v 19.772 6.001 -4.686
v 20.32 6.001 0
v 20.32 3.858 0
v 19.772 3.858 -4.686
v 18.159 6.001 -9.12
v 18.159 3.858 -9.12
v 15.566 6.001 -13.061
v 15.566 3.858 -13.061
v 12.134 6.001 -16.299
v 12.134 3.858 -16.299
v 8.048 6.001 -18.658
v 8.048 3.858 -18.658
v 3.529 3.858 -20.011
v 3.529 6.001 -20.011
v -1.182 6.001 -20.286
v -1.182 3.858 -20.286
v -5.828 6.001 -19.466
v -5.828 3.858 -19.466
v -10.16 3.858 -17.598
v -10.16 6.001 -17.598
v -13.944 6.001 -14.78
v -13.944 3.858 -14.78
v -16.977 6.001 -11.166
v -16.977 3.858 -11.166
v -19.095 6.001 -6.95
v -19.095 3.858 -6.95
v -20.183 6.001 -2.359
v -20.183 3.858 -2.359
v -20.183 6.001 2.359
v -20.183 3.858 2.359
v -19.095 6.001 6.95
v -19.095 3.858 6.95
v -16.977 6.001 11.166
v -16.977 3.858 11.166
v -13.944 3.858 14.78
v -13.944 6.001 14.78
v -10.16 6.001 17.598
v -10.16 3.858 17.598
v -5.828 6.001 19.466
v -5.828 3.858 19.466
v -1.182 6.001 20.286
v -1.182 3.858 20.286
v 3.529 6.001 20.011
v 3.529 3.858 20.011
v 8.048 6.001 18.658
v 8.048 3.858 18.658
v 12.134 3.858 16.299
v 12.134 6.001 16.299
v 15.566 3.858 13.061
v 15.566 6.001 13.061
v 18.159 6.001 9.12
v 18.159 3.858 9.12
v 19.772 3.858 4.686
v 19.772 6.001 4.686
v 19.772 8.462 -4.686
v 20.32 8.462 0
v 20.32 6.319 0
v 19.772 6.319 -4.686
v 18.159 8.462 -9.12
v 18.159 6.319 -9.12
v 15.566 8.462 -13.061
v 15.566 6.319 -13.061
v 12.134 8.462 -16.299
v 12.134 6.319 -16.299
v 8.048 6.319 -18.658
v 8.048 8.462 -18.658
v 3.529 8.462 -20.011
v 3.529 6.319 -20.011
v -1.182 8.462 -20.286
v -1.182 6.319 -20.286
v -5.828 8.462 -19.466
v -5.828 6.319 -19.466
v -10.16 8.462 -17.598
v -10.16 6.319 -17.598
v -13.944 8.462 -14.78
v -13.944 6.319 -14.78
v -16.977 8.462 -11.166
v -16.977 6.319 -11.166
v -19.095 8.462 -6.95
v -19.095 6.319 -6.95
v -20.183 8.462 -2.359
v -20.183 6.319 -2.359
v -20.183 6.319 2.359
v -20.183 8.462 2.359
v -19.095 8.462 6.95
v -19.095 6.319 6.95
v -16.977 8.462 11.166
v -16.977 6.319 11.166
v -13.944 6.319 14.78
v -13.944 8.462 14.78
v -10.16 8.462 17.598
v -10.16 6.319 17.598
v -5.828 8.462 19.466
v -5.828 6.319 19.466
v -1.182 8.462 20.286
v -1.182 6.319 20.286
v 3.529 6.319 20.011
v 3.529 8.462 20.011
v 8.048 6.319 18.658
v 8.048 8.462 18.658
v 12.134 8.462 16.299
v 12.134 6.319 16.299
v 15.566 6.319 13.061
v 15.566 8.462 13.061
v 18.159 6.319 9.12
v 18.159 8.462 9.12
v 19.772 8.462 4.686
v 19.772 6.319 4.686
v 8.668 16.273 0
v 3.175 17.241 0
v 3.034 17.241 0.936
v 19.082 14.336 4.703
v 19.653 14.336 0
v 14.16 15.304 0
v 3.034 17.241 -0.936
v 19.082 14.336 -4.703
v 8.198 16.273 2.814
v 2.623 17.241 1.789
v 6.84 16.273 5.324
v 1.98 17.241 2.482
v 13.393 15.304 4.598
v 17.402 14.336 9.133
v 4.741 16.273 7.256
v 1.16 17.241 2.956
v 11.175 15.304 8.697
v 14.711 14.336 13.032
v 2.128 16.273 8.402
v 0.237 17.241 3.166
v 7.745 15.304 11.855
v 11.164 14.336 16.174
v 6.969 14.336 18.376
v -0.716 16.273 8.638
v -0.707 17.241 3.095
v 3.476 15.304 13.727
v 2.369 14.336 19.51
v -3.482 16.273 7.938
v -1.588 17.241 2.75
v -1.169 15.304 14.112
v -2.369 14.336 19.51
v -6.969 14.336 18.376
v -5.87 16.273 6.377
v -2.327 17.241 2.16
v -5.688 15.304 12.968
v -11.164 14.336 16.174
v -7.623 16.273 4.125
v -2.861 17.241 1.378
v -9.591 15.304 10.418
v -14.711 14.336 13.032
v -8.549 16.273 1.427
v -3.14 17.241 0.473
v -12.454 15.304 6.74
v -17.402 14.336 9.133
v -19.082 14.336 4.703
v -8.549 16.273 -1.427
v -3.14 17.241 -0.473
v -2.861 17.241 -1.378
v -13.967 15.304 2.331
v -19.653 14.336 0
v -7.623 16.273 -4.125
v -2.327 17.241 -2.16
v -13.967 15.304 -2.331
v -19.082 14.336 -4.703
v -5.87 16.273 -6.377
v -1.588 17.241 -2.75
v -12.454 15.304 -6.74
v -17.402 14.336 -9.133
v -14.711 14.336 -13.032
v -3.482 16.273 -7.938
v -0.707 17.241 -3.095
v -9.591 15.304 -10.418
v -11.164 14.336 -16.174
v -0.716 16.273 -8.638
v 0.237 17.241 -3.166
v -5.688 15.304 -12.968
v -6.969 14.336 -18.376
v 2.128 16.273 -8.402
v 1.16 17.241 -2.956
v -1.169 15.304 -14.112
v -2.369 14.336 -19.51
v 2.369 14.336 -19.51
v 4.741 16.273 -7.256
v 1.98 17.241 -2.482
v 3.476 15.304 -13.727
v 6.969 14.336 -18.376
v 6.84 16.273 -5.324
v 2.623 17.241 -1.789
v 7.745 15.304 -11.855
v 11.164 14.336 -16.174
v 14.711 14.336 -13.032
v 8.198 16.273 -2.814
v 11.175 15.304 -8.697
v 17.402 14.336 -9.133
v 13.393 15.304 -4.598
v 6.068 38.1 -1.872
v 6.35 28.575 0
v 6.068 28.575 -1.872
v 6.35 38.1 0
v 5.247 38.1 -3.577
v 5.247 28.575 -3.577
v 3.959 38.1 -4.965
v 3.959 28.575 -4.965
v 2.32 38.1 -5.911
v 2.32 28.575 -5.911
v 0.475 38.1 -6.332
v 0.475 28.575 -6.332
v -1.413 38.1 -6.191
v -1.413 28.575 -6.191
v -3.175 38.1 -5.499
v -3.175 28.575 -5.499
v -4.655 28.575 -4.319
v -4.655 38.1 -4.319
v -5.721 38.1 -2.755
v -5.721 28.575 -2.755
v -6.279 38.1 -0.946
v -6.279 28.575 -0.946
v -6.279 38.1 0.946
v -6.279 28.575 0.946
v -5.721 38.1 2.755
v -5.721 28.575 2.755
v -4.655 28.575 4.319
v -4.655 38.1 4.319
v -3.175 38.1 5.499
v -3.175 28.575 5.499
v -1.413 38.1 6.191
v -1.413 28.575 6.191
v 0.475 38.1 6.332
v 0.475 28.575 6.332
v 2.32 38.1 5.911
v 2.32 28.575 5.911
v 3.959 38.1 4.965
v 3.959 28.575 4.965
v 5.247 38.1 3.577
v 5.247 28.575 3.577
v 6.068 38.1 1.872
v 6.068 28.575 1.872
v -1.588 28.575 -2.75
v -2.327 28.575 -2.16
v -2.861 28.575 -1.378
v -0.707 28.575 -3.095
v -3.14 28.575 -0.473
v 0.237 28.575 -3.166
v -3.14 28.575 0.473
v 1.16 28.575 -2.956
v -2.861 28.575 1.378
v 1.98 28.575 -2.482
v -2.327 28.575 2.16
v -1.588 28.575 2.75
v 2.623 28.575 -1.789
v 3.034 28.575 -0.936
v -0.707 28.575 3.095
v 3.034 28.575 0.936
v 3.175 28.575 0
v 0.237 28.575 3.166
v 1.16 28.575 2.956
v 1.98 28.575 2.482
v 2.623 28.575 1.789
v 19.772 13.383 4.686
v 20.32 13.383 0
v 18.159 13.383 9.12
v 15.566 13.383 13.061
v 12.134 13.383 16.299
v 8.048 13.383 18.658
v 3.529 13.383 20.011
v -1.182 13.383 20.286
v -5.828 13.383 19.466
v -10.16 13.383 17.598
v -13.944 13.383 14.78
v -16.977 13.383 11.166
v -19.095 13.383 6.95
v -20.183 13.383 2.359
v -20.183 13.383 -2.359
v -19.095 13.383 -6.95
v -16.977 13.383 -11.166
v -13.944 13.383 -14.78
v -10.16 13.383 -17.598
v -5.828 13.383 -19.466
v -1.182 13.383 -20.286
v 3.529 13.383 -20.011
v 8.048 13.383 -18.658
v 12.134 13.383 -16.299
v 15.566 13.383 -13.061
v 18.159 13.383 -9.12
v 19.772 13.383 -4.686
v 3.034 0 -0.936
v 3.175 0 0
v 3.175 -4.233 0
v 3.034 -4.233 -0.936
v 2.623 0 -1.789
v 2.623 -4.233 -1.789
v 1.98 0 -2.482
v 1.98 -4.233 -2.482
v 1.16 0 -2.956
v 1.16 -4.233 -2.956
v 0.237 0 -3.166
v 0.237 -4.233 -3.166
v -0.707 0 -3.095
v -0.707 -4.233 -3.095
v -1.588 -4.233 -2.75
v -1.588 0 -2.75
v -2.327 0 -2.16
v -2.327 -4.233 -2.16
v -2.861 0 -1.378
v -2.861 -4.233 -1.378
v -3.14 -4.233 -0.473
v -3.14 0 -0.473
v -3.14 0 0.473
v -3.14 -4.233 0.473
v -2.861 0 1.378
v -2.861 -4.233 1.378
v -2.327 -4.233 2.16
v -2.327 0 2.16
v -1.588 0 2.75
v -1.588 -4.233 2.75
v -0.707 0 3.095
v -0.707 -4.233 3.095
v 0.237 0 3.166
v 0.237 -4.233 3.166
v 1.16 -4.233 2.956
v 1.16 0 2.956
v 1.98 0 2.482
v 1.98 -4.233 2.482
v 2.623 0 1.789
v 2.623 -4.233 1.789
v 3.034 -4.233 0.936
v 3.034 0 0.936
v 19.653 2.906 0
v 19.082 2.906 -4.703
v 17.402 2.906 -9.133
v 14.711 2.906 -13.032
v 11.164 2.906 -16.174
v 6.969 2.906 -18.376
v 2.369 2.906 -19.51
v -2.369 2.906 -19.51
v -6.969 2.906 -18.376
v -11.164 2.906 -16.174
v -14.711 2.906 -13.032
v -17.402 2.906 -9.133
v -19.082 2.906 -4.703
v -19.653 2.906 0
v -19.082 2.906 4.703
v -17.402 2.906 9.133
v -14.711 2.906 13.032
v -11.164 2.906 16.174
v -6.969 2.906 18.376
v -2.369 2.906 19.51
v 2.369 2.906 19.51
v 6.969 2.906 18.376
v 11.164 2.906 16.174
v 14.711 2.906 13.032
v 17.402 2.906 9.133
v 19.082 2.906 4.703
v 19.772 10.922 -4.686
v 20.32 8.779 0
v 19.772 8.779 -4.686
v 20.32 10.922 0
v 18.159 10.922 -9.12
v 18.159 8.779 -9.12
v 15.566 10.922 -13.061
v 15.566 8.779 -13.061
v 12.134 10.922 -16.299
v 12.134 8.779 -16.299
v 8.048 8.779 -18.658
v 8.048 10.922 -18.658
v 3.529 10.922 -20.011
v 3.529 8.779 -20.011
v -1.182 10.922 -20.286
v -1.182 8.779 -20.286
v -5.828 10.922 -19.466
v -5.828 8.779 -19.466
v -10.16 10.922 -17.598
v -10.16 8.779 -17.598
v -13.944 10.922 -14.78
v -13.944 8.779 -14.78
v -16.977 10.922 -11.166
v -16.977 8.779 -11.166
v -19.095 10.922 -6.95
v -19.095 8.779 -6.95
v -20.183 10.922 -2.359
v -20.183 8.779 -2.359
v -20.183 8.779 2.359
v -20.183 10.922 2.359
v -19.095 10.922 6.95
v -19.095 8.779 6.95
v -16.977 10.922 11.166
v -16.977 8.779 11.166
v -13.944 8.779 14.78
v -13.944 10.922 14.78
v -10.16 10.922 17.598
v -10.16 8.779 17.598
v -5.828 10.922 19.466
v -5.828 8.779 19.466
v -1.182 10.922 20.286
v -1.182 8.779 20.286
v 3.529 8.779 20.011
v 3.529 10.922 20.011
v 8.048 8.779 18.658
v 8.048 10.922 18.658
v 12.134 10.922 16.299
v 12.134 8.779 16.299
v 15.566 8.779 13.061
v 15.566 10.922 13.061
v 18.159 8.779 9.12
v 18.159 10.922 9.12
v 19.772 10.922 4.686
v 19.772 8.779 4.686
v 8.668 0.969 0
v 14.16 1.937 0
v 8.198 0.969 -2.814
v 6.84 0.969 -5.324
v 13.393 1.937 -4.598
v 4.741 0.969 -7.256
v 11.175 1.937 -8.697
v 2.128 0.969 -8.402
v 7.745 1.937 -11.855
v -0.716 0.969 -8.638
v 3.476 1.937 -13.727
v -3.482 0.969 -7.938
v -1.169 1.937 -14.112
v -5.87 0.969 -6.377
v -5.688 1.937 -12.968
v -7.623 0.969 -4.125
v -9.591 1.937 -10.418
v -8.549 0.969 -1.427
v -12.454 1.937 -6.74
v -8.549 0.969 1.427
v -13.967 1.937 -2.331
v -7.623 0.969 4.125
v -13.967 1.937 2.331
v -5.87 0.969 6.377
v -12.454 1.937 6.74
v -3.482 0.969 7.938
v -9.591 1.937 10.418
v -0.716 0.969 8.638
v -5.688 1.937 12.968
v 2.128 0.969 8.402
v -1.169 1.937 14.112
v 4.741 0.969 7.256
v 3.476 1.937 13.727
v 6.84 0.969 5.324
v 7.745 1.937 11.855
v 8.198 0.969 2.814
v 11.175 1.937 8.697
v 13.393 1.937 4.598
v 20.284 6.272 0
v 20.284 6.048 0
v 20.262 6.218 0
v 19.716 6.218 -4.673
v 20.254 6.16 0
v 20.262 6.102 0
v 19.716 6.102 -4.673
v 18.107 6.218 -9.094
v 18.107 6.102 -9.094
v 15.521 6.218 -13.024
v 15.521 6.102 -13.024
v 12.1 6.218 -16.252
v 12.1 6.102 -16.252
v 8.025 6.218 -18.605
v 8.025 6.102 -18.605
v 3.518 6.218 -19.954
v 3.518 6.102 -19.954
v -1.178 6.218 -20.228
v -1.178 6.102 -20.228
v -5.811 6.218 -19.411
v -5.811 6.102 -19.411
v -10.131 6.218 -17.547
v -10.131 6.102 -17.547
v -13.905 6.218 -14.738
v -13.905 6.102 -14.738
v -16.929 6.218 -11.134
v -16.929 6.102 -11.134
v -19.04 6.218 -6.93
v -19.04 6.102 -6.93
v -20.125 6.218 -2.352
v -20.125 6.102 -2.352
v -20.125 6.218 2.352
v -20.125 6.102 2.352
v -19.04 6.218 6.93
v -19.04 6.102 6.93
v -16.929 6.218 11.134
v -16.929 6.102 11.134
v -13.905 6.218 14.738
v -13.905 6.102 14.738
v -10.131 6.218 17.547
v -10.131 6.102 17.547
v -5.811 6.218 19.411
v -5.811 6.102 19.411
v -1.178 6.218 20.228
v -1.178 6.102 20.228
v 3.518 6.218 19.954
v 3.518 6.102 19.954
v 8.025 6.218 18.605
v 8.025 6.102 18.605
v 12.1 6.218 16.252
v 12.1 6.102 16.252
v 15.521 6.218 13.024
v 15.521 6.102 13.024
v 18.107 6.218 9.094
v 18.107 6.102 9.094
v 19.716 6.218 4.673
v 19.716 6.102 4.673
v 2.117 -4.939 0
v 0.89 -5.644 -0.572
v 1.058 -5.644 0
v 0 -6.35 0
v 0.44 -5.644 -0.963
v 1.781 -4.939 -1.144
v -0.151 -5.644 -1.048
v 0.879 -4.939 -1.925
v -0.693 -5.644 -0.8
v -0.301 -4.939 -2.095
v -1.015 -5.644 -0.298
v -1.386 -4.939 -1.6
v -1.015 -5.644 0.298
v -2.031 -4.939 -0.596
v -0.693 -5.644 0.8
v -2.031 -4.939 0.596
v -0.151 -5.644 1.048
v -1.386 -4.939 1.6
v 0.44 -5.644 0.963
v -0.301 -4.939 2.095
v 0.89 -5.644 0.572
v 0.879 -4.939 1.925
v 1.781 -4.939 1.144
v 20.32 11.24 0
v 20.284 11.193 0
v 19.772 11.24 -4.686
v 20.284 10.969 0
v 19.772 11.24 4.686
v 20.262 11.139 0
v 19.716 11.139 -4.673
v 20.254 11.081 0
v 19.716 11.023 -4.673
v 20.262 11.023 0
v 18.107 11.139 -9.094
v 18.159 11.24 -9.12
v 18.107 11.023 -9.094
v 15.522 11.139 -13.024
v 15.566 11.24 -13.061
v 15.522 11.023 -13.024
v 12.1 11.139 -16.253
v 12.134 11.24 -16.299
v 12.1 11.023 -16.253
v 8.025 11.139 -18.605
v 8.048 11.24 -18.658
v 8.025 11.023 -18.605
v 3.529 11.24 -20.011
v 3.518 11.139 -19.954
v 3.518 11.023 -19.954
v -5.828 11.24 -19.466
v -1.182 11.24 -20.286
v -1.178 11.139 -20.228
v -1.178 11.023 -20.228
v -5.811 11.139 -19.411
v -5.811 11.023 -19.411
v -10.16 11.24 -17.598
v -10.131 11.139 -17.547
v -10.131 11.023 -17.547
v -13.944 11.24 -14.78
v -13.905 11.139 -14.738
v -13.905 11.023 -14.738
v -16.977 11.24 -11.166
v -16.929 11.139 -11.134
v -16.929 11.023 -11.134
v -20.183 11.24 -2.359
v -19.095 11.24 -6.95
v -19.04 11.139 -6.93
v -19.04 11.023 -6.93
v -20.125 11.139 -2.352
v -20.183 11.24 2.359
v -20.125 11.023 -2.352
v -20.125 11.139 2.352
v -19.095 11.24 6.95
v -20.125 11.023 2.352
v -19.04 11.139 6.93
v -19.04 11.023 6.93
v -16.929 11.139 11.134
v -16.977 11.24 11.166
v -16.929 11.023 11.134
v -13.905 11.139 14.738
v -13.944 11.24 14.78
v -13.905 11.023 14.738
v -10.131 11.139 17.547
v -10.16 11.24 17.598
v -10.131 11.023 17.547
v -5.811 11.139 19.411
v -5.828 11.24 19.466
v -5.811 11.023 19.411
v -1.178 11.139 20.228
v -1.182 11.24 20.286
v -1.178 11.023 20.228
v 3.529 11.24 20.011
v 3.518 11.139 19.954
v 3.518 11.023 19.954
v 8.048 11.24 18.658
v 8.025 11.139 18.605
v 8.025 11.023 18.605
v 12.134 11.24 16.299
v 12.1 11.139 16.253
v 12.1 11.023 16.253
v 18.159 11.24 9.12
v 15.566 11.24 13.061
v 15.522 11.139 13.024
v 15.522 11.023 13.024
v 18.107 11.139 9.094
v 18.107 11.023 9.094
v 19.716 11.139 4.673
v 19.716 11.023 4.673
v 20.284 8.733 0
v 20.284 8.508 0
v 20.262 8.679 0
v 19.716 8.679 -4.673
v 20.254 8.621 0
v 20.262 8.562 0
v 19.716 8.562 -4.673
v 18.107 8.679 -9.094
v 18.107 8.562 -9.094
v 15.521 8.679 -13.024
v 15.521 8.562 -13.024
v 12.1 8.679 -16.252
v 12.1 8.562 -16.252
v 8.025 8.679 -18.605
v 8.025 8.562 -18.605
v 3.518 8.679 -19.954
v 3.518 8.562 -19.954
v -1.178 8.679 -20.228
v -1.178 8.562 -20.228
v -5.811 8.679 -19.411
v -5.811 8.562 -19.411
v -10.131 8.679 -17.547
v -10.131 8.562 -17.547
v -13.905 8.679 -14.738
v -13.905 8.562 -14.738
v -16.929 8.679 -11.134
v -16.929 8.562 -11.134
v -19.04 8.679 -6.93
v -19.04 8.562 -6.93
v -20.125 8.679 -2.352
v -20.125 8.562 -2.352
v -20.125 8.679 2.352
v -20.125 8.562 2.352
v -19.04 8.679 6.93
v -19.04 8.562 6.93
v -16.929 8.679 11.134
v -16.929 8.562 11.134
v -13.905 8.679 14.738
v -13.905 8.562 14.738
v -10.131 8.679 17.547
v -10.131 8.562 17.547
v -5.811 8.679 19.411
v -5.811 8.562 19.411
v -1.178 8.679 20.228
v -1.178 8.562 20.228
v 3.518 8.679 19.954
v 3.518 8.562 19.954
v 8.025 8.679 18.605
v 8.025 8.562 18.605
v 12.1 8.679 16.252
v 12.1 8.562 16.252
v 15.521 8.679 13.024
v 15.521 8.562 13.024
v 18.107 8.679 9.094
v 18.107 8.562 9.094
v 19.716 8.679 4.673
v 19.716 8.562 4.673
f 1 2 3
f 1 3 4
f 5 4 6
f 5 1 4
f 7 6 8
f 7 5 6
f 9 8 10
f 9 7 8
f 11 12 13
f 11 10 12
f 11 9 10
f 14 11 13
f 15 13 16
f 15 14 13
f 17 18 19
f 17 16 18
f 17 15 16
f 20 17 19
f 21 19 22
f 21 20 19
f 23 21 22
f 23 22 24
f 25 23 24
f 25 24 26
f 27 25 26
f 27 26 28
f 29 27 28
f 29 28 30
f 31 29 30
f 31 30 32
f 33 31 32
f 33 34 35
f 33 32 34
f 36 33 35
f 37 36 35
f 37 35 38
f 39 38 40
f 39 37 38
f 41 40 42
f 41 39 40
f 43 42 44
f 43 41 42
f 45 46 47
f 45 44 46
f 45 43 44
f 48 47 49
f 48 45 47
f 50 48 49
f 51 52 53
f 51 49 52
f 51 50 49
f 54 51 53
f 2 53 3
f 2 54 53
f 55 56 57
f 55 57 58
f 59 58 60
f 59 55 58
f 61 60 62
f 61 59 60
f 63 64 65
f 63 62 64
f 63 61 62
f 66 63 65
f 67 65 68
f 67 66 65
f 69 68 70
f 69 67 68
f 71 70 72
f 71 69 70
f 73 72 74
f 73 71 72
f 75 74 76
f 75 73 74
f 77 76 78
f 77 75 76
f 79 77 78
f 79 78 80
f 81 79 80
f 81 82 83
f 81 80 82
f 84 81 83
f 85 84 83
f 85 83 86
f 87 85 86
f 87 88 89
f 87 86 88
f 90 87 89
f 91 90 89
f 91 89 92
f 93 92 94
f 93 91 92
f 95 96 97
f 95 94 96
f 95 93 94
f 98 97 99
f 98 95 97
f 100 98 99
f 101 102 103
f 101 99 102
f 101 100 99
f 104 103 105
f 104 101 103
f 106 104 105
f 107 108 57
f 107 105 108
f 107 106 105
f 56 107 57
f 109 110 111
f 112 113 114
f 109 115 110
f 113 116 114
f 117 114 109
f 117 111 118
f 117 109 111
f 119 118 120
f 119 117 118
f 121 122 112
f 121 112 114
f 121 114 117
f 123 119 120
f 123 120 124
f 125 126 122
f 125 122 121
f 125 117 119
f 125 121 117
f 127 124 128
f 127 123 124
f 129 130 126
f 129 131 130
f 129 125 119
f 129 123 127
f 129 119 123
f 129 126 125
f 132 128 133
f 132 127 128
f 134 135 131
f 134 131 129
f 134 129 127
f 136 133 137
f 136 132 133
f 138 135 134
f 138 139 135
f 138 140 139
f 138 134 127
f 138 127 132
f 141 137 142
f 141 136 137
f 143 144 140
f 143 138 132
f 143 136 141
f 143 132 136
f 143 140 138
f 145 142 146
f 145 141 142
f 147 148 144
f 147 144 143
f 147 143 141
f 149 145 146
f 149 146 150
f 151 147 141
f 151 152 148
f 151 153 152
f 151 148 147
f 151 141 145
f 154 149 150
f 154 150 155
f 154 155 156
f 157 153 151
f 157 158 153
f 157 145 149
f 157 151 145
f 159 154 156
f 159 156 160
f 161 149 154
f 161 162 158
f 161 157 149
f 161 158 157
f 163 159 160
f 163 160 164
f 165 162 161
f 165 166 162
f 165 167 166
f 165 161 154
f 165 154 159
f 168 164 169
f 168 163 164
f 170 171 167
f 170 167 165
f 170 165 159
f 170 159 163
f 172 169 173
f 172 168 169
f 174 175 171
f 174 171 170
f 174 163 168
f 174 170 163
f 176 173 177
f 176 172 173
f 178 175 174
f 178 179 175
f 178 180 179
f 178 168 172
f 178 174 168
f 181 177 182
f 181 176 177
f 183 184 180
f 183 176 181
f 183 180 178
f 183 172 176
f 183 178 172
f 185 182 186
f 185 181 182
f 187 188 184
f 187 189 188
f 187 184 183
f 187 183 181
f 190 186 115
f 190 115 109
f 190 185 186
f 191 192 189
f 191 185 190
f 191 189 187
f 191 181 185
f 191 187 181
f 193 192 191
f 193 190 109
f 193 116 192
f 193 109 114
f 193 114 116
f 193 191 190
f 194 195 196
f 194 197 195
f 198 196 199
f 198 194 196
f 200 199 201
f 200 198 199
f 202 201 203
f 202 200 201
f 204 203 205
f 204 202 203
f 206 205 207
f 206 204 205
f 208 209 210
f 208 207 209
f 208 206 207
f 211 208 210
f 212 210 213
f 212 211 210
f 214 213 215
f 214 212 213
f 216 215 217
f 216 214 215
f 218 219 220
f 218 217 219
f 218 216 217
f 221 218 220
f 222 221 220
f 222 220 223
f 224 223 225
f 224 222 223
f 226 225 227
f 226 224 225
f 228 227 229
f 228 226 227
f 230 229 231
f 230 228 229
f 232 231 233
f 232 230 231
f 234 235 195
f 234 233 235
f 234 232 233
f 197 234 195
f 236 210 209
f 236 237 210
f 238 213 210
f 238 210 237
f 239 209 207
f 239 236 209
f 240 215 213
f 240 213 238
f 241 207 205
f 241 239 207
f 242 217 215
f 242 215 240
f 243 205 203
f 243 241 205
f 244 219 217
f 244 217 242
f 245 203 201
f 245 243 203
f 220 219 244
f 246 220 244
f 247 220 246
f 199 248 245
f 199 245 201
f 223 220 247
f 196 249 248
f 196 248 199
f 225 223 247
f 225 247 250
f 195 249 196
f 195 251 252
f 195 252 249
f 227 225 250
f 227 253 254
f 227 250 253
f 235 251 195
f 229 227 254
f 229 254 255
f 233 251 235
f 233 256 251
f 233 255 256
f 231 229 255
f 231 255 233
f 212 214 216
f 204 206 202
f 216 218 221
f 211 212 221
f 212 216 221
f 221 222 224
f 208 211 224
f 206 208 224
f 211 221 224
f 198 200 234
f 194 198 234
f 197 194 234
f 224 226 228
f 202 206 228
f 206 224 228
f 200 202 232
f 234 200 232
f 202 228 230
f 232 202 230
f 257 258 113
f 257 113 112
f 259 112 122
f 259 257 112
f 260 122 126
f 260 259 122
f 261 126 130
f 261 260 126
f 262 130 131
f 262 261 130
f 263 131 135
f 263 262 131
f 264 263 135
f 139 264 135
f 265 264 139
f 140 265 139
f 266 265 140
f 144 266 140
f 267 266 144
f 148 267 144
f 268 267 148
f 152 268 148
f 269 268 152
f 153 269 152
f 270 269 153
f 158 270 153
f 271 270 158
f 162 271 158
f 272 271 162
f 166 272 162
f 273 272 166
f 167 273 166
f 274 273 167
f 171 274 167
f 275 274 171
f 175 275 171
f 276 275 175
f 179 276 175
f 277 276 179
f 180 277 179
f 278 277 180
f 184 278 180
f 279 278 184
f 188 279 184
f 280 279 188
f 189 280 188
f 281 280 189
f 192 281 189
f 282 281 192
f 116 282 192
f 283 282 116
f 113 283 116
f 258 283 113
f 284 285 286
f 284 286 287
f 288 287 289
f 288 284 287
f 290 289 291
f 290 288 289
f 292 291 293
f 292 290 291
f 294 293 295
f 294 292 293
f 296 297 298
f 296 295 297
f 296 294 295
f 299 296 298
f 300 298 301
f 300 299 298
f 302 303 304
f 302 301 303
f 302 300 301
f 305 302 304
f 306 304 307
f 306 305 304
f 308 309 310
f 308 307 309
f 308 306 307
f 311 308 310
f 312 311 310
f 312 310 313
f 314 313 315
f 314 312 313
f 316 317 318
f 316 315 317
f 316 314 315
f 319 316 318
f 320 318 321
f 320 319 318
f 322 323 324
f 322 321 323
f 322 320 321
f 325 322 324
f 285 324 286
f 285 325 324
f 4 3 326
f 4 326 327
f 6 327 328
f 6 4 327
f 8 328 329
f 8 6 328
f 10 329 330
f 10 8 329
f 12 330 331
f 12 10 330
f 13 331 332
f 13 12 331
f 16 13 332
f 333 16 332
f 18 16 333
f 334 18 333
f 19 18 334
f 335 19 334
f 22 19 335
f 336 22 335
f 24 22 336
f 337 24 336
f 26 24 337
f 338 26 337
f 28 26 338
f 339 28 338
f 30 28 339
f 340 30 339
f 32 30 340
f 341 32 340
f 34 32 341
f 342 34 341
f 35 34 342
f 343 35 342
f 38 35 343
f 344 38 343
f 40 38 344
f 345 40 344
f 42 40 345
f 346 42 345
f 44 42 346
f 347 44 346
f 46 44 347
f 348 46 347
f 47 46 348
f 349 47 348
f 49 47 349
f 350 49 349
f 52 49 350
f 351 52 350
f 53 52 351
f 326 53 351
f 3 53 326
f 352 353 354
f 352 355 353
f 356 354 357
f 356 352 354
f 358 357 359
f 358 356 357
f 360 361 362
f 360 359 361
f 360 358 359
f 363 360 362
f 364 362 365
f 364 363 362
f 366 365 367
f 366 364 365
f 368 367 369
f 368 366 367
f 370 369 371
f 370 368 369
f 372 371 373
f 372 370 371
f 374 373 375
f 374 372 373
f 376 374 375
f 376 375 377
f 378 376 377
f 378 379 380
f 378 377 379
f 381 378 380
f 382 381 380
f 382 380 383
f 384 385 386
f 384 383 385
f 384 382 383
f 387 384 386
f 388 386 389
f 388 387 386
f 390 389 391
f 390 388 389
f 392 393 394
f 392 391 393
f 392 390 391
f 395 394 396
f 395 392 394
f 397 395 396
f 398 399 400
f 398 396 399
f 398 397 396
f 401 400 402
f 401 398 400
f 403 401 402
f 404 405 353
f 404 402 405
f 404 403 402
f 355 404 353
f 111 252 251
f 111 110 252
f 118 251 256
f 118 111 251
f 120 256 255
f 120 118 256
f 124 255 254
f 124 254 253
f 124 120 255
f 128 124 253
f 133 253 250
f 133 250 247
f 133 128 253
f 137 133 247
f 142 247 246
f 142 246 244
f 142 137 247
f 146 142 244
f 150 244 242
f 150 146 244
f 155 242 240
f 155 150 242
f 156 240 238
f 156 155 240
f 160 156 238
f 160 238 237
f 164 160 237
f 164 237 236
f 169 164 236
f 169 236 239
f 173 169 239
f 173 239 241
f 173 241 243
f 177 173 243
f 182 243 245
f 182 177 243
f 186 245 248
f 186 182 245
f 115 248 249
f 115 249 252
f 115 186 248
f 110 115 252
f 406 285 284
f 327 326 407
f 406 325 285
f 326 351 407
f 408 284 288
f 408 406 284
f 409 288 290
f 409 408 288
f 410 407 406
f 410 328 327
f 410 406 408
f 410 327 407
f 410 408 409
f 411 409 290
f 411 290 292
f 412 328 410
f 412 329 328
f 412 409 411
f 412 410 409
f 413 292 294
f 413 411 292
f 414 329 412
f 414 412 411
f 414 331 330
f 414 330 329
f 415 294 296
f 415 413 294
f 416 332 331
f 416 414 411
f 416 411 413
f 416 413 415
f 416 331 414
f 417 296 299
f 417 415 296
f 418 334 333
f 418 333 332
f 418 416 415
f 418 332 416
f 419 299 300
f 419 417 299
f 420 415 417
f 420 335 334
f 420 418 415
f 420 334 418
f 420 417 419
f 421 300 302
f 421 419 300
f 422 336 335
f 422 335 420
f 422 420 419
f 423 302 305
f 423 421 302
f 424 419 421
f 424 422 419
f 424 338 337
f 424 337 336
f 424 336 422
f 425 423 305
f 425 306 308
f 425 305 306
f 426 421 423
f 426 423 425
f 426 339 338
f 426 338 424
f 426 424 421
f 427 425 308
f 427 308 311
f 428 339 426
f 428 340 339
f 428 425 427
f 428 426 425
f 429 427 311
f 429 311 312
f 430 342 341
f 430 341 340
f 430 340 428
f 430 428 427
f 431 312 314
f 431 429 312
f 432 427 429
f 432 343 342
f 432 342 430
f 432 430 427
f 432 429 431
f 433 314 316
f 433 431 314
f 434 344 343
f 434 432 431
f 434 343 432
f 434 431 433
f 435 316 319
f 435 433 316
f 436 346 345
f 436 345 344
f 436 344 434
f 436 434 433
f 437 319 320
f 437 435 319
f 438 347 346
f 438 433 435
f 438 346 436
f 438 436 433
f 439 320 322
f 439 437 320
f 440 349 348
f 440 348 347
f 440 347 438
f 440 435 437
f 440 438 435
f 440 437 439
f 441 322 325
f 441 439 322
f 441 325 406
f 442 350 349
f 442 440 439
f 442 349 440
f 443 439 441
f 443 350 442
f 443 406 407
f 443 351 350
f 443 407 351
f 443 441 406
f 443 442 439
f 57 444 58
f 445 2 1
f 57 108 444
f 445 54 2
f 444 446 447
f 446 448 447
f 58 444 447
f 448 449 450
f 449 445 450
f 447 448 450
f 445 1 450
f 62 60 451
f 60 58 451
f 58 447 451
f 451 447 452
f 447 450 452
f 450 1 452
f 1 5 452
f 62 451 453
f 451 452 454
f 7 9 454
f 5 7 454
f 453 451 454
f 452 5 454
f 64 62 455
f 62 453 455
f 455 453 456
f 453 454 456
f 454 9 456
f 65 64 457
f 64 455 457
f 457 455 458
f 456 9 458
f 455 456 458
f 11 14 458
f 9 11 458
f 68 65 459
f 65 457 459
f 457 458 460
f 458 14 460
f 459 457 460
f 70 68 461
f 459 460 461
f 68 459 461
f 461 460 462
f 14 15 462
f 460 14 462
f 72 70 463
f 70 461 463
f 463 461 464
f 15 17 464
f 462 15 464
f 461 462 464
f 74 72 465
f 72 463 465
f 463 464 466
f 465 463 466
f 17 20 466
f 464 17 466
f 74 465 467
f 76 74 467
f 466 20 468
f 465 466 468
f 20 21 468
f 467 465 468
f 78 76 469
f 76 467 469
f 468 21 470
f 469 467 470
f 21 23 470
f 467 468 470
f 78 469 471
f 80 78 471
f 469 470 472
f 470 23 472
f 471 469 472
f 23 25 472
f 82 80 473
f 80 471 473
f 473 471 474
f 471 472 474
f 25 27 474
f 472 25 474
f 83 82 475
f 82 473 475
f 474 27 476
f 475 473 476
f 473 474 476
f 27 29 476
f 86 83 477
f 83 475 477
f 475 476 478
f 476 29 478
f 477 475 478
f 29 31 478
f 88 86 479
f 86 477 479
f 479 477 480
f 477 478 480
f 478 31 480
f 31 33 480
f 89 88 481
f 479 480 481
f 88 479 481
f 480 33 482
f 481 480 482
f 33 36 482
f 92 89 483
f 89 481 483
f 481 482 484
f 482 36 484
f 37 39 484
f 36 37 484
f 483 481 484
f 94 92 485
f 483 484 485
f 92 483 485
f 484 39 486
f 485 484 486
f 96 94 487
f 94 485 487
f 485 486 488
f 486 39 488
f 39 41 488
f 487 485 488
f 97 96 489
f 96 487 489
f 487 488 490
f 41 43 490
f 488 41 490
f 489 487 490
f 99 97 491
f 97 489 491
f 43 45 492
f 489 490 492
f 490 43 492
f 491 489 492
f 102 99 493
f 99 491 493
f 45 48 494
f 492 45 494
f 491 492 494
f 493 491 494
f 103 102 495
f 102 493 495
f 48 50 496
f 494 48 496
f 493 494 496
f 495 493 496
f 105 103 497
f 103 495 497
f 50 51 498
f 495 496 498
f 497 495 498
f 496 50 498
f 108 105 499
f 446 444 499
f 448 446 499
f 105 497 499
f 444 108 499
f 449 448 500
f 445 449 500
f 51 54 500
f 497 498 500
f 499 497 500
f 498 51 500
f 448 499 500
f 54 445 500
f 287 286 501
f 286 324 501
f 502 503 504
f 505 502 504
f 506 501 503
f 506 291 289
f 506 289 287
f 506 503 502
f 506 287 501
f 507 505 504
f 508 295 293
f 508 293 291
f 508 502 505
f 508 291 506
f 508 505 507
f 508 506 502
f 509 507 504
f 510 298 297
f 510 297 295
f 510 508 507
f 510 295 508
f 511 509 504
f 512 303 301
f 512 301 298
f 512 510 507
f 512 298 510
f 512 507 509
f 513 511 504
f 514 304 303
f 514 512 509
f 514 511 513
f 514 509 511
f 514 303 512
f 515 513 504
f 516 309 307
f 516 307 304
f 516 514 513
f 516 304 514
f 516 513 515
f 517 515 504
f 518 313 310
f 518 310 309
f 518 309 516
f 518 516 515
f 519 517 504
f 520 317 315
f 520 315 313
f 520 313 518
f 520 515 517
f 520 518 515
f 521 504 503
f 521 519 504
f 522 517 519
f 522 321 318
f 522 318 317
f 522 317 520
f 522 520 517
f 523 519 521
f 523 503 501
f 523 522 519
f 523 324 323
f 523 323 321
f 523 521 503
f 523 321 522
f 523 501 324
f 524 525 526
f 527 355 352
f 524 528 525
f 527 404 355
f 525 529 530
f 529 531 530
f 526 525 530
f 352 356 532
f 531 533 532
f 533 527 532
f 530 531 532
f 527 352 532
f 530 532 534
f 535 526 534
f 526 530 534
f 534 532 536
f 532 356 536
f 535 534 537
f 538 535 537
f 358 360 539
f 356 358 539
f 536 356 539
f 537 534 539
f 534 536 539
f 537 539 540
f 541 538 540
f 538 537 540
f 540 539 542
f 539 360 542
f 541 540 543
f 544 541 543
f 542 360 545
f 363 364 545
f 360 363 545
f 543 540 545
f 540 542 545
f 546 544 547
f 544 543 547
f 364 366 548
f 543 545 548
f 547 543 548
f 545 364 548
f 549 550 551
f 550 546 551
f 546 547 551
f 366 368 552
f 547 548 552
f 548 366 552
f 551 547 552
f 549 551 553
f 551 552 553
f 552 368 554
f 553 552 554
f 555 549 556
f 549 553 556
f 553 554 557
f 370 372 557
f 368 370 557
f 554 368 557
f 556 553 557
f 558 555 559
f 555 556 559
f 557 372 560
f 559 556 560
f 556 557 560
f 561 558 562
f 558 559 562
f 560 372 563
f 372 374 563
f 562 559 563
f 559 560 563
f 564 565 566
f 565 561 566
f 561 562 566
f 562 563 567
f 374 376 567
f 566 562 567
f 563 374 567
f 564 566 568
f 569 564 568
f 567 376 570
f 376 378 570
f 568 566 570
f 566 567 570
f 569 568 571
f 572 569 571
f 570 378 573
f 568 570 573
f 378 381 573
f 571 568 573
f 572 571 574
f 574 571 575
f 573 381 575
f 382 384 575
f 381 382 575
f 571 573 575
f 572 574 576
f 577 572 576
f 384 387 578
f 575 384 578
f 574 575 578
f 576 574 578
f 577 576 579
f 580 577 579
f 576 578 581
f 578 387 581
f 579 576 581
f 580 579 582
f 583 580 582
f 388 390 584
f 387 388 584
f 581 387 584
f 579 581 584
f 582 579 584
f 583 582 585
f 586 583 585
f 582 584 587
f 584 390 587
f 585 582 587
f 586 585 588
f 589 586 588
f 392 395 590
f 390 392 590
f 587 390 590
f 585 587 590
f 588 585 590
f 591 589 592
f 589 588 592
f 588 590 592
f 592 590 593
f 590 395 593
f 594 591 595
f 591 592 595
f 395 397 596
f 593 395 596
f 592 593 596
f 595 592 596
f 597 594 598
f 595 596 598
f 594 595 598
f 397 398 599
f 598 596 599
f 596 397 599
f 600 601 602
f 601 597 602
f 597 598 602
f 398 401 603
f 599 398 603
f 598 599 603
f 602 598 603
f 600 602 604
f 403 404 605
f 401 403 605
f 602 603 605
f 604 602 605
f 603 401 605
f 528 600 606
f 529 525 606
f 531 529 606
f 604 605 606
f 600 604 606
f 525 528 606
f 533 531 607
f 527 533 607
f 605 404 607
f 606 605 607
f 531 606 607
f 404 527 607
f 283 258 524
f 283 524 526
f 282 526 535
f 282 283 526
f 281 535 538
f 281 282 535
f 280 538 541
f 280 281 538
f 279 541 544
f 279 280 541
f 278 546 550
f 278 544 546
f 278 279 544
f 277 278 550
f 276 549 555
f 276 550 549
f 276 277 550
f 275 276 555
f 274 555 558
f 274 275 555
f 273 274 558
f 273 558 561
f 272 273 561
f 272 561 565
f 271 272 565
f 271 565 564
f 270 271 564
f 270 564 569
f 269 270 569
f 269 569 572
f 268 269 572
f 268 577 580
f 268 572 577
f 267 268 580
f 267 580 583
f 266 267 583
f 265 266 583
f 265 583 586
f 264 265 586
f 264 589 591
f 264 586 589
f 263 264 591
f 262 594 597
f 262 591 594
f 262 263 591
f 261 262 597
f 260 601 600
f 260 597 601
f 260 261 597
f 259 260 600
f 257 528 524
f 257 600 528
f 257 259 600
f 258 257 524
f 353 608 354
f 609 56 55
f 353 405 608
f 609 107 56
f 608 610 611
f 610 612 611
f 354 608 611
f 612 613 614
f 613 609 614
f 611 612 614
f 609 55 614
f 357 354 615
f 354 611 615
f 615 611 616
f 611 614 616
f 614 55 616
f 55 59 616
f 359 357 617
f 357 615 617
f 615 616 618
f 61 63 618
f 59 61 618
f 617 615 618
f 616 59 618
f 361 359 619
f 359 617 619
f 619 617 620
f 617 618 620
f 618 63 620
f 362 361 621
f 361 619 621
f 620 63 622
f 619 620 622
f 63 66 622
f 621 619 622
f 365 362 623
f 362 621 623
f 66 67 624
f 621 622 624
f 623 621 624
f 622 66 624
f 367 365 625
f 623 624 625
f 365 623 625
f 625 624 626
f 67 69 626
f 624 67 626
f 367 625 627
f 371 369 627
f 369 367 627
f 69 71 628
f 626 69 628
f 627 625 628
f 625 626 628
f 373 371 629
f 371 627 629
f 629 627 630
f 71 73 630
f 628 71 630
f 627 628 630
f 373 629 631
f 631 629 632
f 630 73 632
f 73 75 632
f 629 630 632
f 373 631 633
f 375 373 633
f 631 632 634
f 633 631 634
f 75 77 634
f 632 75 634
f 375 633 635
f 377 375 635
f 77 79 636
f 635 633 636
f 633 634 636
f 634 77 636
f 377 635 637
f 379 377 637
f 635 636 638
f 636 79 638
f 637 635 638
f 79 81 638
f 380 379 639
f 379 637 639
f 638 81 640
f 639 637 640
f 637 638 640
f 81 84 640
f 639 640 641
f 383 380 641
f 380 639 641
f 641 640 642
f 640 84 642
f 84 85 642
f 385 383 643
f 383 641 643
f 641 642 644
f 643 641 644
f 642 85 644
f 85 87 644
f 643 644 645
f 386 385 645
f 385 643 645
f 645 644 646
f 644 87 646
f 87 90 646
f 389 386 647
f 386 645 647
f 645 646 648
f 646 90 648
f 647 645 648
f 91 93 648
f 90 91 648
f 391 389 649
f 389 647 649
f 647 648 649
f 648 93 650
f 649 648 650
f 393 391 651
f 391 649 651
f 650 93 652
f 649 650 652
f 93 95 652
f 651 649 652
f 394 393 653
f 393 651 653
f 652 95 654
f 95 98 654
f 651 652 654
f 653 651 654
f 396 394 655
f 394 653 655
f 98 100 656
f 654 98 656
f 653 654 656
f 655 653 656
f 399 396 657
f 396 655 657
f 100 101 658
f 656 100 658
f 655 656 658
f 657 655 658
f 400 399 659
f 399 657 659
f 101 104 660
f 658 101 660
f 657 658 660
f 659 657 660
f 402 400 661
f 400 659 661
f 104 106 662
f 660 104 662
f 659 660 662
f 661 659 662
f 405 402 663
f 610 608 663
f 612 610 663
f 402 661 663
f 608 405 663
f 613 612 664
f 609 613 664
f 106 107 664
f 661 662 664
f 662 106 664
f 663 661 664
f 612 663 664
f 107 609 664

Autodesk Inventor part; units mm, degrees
ref_plane "YZ Plane" through (0, 0, 0) normal (1, 0, 0) x (0, 1, 0)
ref_plane "XZ Plane" through (0, 0, 0) normal (0, 1, 0) x (-1, 0, 0)
ref_plane "XY Plane" through (0, 0, 0) normal (0, 0, 1) x (1, 0, 0)
sketch "Sketch1" plane through (0, 0, 0) normal (0, 0, 1) x (1, 0, 0)
  line L0 (0, 0) -> (0, 28.575)
  line L1 (0, 0) -> (0, -6.35)
  line L2 (0, 28.575) -> (0, 38.1)
  line L3 (6.35, 28.575) -> (6.35, 38.1)
  line L4 (6.35, 38.1) -> (0, 38.1)
  line L5 (3.175, 17.0324) -> (0, 17.0324) construction
  line L6 (6.35, 28.575) -> (3.175, 28.575)
  line L7 (3.175, 28.575) -> (0, 28.575) construction
  line L8 (0, 0) -> (3.175, 0) construction
  line L9 (3.175, 0) -> (17.91, 0) construction
  line L10 (19.6531, 2.9055) -> (20.32, 3.858)
  line L11 (0, -6.35) -> (3.175, -4.2333)
  line L12 (3.175, -4.2333) -> (3.175, 0)
  line L13 (3.175, 0) -> (19.6531, 2.9055)
  line L14 (3.175, 28.575) -> (3.175, 17.2411)
  line L15 (20.32, 13.383) -> (19.6531, 14.3355)
  line L16 (19.6531, 14.3355) -> (3.175, 17.2411)
  line L17 (20.32, 8.7793) -> (20.1613, 8.6205) construction
  line L18 (20.1613, 8.6205) -> (20.32, 8.4618) construction
  arc A0 (6.35, 38.1) -> (0, 40.0262) centre (0, 28.5962) ccw
  line L19 (20.32, 6.3187) -> (20.1612, 6.1599) construction
  line L20 (20.1612, 6.1599) -> (20.32, 6.0012) construction
  line L21 (20.32, 10.9224) -> (20.1612, 11.0812) construction
  line L22 (20.1612, 11.0812) -> (20.32, 11.2399) construction
  line L23 (20.32, 3.858) -> (20.32, 6.0012)
  line L24 (20.32, 6.3187) -> (20.32, 8.4618)
  line L25 (20.32, 8.7793) -> (20.32, 10.9224)
  line L26 (20.32, 11.2399) -> (20.32, 13.383)
  line L27 (20.32, 6.0012) -> (20.32, 6.3187) construction
  line L28 (20.32, 8.4618) -> (20.32, 8.7793) construction
  line L29 (20.32, 10.9224) -> (20.32, 11.2399) construction
  arc A1 (20.32, 11.2399) -> (20.32, 10.9224) centre (20.4787, 11.0812) ccw
  arc A2 (20.32, 8.7793) -> (20.32, 8.4618) centre (20.4787, 8.6205) ccw
  arc A3 (20.32, 6.3187) -> (20.32, 6.0012) centre (20.4787, 6.1599) ccw
  dimension "d5" = 44.45
  dimension "d6" = 9.525
  dimension "d7" = 6.35
  dimension "d12" = 2.1167
  dimension "d13" = 3.175
  dimension "d15" = 4.2333
  dimension "d24" = 10
  dimension "d28" = 3.175
  dimension "d31" = 110
  dimension "d32" = 100
  dimension "d35" = 11.43
  dimension "d36" = 0.3175
  dimension "d37" = 9.525
  dimension "d40" = 11.43
  dimension "d42" = 20.32
revolve "Revolution1" add sketch "Sketch1" angle 360 about axis through (0, 28.575, 0) along (0, -1, 0)
properties part number "Top1"
